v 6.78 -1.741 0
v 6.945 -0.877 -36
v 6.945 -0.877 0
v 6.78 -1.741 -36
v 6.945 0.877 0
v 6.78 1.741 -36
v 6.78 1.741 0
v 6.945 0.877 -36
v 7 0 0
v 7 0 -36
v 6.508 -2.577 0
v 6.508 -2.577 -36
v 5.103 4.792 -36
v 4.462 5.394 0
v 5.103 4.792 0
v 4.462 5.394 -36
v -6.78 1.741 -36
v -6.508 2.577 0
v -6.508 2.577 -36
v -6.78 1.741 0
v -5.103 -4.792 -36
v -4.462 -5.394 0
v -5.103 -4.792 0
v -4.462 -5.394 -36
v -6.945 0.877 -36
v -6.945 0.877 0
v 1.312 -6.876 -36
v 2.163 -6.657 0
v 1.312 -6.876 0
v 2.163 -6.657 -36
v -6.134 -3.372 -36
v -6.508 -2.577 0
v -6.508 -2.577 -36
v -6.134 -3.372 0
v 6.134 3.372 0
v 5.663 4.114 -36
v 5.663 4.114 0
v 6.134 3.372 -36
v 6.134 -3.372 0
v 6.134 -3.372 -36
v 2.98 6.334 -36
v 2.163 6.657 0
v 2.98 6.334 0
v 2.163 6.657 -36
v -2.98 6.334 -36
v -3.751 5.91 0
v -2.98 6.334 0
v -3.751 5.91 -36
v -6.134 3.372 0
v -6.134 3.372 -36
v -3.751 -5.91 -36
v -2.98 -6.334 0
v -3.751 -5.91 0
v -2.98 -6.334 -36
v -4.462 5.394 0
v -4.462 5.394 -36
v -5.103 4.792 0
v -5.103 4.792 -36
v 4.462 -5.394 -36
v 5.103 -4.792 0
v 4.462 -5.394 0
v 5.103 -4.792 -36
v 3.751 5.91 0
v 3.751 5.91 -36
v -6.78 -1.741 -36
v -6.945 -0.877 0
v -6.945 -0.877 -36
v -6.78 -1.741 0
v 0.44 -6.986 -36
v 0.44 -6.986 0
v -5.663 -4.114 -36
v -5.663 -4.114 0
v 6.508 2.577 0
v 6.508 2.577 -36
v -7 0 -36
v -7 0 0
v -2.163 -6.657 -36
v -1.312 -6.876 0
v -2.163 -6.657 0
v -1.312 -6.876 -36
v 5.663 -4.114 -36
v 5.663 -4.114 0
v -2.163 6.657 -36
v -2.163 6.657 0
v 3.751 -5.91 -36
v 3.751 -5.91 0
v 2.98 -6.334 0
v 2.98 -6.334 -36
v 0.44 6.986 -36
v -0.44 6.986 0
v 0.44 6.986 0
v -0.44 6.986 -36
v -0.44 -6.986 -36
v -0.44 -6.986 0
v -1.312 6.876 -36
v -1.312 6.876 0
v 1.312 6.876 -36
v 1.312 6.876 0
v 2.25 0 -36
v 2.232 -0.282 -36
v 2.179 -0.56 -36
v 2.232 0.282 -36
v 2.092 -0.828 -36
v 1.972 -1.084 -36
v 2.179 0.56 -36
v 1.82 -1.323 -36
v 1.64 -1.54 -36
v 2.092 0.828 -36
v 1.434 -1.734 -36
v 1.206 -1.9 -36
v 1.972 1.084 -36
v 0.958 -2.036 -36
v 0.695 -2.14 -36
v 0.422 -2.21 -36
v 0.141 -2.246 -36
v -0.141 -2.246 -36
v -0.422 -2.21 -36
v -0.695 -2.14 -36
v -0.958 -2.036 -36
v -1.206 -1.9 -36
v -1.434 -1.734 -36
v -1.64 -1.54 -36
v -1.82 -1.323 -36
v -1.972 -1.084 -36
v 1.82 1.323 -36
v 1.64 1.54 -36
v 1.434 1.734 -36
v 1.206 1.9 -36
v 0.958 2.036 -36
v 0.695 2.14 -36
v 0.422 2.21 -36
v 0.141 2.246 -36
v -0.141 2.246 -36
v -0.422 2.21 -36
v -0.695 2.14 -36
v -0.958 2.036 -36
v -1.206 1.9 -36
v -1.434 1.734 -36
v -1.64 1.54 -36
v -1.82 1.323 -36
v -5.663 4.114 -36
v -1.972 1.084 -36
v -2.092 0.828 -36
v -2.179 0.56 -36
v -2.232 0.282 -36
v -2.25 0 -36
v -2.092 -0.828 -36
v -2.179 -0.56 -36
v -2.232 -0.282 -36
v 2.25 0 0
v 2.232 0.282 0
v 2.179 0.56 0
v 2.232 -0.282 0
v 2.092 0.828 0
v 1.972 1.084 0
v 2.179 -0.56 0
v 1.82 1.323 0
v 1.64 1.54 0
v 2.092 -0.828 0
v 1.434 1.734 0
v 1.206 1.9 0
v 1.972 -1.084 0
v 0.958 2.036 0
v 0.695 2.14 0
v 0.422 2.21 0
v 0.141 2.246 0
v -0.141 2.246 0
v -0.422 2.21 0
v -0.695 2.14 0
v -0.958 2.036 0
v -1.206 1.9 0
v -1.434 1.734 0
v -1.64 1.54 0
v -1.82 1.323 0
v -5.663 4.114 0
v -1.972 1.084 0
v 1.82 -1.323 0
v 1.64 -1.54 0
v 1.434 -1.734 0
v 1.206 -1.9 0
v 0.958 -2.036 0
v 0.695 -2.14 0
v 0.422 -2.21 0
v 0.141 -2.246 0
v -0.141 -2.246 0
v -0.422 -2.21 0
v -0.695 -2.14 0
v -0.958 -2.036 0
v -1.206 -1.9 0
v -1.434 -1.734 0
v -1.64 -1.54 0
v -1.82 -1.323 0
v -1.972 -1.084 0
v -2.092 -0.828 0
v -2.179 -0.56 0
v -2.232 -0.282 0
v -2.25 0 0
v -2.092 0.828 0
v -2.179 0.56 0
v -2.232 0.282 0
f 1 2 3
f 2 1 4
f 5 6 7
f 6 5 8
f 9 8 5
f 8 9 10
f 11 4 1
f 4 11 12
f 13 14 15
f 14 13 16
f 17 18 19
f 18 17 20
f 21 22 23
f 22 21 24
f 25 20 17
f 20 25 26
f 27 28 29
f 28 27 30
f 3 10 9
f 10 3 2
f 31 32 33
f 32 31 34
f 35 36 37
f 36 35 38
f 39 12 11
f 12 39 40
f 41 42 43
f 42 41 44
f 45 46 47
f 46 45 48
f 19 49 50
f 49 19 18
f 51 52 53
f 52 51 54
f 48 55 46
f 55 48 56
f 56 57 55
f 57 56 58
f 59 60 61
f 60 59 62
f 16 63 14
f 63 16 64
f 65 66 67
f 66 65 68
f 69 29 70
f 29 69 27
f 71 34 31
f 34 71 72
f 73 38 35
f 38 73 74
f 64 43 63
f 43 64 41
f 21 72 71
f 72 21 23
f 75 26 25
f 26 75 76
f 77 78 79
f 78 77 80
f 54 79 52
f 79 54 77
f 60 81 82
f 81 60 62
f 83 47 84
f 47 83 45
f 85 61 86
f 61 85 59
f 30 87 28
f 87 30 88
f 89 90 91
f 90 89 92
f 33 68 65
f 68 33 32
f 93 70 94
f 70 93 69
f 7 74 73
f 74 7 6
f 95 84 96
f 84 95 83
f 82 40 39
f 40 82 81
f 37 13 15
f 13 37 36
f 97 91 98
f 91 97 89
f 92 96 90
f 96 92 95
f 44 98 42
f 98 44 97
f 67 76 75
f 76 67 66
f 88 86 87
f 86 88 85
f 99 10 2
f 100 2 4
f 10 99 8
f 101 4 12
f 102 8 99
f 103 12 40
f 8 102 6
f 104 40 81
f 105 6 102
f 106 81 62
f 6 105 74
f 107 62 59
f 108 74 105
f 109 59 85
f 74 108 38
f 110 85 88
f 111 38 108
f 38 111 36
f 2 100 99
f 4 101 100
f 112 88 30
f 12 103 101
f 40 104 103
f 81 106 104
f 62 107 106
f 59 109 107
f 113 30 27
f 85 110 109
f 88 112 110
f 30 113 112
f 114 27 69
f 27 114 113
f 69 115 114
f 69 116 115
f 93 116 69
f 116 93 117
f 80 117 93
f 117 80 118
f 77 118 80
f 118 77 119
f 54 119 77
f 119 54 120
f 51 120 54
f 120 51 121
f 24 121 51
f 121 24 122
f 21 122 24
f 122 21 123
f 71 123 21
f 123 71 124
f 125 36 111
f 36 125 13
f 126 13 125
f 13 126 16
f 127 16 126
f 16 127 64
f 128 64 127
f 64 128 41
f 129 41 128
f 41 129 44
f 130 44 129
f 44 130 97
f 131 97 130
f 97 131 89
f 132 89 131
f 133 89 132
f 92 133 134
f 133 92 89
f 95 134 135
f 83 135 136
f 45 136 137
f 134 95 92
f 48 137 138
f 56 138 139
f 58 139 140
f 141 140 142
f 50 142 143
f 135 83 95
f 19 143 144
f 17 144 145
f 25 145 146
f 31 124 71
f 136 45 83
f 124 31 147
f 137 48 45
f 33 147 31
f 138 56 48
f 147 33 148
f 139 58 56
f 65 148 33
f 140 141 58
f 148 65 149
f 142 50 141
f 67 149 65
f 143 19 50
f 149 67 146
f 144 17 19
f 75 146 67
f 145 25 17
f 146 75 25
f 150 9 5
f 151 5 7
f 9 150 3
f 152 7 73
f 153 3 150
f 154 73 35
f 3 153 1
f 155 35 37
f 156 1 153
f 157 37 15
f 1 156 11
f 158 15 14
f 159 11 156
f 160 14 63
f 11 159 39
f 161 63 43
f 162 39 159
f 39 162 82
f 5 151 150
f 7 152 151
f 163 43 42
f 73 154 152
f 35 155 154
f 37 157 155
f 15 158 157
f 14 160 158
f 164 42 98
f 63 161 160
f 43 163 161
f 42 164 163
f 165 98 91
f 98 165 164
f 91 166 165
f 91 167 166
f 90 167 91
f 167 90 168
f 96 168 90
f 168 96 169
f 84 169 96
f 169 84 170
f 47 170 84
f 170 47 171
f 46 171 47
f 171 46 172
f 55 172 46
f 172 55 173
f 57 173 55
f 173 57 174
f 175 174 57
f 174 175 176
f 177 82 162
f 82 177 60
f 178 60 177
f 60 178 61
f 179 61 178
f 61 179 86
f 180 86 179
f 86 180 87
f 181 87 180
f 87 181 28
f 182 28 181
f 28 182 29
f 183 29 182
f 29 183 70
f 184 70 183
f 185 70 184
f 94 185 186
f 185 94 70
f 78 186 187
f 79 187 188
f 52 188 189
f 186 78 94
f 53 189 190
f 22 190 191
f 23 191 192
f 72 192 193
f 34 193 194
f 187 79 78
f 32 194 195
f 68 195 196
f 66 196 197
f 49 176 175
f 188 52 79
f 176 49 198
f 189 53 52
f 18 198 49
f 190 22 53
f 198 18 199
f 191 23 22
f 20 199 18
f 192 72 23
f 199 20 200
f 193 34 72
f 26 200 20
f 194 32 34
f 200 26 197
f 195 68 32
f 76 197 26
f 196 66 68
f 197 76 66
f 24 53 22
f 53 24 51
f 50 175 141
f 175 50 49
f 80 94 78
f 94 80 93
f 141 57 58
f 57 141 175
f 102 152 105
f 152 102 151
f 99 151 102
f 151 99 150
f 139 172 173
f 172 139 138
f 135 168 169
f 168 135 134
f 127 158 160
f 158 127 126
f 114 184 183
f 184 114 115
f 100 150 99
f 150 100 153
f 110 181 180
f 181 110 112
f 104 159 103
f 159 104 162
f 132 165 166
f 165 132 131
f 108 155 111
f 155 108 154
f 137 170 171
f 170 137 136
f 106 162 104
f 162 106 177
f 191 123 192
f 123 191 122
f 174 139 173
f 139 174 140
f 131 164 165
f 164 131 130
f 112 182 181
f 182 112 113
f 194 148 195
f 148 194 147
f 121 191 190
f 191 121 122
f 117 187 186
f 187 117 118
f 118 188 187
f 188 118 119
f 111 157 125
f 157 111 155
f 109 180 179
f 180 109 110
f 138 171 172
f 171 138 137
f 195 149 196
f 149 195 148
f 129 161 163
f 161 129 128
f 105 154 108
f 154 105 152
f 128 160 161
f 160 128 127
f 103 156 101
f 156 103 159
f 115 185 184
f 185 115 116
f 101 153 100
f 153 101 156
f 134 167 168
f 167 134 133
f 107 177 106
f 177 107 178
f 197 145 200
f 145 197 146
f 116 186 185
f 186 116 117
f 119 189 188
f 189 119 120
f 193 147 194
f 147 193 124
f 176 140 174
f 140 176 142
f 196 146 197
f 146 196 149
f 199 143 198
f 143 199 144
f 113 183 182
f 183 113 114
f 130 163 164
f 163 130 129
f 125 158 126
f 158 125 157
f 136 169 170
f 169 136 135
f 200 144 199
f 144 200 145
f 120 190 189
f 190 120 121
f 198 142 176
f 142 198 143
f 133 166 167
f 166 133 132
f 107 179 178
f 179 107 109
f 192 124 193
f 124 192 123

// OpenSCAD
$fn = 50;


difference() {
	union() {
		translate(v = [0, 0, -36.0000000000]) {
			cylinder(h = 36, r = 7.0000000000);
		}
		cylinder(h = 0, r = 10.0000000000);
	}
	union() {
		#translate(v = [0, 0, -36]) {
			cylinder(h = 36, r = 2.2500000000);
		}
	}
}
